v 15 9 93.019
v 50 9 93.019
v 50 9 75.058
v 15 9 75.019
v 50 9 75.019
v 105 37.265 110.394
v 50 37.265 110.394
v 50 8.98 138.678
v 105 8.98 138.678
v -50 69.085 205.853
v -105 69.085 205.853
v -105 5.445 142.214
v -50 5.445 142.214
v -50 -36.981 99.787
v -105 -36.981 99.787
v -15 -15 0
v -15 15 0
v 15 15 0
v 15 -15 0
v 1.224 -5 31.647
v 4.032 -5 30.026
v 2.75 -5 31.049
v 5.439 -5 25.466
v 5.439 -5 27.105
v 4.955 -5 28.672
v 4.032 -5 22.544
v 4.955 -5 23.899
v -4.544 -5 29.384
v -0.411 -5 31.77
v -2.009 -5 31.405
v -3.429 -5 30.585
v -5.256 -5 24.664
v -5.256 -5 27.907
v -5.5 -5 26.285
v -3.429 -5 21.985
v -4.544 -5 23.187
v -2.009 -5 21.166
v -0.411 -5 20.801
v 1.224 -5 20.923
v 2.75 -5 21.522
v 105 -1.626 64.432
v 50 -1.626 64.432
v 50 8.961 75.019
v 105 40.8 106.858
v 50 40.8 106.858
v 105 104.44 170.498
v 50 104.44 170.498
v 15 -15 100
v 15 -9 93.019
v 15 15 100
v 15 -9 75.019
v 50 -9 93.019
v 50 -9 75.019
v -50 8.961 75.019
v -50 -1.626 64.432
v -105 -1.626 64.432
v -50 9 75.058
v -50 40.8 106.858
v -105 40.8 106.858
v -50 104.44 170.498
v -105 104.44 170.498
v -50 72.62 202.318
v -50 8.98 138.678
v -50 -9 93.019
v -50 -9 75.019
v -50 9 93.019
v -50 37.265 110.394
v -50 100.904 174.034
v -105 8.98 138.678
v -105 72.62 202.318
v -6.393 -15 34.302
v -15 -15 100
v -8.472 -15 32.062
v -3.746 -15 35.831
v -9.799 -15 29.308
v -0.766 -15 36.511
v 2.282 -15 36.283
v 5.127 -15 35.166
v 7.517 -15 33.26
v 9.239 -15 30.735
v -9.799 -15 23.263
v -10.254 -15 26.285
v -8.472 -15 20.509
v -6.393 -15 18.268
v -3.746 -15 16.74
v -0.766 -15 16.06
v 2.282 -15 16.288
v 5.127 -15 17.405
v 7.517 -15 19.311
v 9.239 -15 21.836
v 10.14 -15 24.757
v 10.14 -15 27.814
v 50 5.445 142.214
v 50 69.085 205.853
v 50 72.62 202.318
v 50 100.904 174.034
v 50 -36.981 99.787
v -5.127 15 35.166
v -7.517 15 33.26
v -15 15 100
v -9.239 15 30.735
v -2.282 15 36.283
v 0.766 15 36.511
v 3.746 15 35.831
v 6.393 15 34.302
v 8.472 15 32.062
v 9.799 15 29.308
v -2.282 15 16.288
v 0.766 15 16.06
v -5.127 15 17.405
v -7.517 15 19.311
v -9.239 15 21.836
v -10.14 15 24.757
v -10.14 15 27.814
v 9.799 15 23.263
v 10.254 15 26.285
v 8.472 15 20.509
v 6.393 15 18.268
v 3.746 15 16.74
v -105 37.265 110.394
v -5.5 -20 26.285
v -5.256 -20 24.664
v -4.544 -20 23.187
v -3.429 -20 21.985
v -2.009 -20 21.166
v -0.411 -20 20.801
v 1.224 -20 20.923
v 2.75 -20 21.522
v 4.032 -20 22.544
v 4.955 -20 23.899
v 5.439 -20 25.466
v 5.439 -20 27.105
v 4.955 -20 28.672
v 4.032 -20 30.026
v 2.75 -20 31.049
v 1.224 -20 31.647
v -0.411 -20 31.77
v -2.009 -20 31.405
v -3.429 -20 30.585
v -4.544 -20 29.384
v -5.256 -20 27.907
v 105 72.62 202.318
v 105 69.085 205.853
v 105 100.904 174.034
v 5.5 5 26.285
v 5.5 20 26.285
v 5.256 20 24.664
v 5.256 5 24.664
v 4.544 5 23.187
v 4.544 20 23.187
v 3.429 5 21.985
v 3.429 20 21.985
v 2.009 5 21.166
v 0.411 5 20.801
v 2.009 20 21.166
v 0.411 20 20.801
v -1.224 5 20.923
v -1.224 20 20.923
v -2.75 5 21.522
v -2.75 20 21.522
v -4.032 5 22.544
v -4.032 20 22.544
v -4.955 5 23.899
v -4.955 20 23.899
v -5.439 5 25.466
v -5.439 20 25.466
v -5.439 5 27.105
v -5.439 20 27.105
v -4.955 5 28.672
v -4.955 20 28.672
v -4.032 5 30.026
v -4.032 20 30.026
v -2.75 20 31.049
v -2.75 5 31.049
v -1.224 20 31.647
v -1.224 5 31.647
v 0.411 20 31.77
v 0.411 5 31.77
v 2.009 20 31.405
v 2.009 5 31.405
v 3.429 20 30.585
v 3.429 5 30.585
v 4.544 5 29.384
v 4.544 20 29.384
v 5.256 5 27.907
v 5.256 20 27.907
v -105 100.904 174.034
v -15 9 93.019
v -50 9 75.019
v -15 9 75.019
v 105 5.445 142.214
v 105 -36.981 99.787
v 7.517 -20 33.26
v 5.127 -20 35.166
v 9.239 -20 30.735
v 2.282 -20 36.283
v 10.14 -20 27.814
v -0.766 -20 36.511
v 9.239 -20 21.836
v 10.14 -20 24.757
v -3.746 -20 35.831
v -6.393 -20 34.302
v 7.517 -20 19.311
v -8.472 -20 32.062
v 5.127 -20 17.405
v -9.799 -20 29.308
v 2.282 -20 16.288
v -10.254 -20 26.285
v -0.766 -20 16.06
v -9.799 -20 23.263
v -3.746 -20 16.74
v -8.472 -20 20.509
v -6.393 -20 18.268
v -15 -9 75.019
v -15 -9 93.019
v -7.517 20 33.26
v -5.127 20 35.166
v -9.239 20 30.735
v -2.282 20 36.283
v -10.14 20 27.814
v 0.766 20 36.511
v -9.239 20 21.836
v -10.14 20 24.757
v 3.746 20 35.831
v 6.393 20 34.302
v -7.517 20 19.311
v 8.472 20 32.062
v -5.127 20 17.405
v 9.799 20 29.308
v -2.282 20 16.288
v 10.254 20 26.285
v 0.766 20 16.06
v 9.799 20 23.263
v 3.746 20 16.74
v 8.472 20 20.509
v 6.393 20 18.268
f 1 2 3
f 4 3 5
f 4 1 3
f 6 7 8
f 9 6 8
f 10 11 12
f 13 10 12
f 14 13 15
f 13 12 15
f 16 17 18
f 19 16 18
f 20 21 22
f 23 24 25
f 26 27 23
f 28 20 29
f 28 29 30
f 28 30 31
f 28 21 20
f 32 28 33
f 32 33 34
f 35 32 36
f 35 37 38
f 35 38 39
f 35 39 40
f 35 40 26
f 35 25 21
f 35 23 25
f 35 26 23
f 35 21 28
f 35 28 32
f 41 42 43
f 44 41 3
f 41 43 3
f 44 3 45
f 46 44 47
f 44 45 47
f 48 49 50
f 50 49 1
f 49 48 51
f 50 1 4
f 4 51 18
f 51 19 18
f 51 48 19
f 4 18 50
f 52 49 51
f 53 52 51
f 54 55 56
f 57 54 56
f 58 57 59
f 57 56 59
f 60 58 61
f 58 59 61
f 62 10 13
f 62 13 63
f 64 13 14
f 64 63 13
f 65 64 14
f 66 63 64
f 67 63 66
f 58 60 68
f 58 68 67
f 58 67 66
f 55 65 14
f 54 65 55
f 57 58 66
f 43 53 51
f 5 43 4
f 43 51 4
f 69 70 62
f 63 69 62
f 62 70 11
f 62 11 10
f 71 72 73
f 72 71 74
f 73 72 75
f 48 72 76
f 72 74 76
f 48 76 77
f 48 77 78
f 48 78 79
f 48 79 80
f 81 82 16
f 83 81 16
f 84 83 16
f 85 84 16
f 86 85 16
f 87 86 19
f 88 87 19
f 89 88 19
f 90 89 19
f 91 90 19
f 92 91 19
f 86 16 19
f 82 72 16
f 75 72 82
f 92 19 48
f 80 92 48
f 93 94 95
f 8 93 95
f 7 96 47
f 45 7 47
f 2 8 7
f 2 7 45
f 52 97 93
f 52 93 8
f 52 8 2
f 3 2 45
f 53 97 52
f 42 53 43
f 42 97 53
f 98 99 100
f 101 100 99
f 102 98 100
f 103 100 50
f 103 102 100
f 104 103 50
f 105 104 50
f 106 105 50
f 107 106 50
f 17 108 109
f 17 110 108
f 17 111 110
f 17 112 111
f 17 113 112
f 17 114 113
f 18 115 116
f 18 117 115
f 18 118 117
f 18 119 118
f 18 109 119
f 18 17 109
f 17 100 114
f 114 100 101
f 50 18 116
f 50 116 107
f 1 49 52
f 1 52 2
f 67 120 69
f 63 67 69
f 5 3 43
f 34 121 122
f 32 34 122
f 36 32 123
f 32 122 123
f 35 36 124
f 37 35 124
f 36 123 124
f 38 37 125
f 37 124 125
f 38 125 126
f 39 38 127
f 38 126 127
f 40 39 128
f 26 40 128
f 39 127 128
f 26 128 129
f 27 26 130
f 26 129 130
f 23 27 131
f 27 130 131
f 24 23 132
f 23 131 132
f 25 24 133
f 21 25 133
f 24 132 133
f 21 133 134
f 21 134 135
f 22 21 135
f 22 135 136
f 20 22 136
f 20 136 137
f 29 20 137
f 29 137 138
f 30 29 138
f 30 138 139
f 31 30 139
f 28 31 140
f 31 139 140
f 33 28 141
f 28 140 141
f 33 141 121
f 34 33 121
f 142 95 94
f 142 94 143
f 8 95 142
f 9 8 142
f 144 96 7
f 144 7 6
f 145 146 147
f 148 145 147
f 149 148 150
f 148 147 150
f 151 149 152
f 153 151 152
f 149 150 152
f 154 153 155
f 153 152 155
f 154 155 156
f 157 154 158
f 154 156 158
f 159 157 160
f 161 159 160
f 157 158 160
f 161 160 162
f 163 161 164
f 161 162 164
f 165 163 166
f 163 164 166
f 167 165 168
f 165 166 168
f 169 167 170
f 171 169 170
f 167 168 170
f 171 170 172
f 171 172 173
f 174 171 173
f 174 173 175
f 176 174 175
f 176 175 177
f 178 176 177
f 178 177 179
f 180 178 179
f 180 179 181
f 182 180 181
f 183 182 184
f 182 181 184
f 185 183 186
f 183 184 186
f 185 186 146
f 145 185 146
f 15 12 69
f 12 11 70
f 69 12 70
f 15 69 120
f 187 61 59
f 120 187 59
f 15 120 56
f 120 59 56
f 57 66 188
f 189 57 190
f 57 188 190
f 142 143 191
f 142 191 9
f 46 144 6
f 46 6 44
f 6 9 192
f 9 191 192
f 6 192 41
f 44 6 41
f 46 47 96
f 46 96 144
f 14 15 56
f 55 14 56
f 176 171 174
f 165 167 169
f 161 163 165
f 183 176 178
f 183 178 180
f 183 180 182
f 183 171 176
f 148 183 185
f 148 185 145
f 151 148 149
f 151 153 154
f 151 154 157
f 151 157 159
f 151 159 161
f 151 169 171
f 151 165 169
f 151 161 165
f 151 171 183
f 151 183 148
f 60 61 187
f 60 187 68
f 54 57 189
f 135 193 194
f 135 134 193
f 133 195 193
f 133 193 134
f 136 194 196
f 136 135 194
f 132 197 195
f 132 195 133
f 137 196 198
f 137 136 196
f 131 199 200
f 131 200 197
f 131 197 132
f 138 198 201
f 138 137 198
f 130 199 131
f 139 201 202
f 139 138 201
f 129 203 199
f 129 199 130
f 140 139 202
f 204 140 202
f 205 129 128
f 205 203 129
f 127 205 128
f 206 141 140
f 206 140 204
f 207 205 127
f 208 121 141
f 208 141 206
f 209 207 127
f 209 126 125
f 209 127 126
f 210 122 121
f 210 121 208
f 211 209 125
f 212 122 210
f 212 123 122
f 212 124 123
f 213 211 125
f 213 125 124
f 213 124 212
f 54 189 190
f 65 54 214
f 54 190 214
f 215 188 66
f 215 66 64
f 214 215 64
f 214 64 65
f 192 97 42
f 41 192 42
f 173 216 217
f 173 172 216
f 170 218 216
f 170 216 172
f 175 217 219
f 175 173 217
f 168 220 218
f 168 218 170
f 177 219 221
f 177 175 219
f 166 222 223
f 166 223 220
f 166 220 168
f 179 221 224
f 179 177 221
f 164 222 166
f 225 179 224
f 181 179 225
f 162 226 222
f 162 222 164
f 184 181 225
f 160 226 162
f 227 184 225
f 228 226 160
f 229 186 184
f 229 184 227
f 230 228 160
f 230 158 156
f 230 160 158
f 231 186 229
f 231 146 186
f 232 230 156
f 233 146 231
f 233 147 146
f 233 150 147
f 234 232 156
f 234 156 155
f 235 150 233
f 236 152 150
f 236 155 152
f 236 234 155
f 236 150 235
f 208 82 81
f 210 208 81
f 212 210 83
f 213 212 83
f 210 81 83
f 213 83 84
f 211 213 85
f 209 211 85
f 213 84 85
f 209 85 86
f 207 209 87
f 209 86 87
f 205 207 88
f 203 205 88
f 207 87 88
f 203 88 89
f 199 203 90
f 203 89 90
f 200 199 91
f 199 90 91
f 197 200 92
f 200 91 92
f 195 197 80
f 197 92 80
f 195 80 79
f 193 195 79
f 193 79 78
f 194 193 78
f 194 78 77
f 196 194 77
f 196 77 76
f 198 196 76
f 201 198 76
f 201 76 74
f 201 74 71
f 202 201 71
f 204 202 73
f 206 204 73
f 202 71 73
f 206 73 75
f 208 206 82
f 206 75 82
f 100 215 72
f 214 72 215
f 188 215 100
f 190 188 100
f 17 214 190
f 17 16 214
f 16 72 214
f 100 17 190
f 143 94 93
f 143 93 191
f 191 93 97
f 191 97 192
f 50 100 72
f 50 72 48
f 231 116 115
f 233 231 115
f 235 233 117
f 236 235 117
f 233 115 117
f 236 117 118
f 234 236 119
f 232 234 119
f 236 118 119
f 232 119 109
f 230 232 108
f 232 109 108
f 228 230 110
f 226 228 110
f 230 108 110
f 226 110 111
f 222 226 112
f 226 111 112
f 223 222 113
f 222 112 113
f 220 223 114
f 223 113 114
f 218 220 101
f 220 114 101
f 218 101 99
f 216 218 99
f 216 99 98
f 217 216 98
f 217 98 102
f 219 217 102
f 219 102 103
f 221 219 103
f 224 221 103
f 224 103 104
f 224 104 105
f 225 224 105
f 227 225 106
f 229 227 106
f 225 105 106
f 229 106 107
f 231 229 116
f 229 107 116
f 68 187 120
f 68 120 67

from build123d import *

# Parameters (mm, degrees)
SKETCH_2_W               = 30
SKETCH_2_H               = 30
EXTRUDE_1_DEPTH          = 100
SKETCH_3_W               = 18
SKETCH_3_H               = 18
EXTRUDE_2_DEPTH          = 35
PATTERN_CIRCULAR_1_COUNT = 2
SKETCH_4_R               = 10.254249717
EXTRUDE_4_DEPTH          = 5
SKETCH_5_R               = 5.5
CUT_EXTRUDE_2_DEPTH      = 15
PATTERN_CIRCULAR_3_COUNT = 2
PATTERN_CIRCULAR_4_COUNT = 2
EXTRUDE_5_DEPTH          = 55
PATTERN_LINEAR_1_COUNT   = 2
PATTERN_LINEAR_1_PITCH   = 155
SKETCH_7_W               = 55
SKETCH_7_H               = 5
EXTRUDE_6_DEPTH          = 90


with BuildPart() as part:
    # 草图2 → 凸台-拉伸1 (new body)
    with BuildSketch(Plane.XY):
        Rectangle(SKETCH_2_W, SKETCH_2_H)
    extrude(amount=EXTRUDE_1_DEPTH)

    # 草图3 → 凸台-拉伸2 (add)
    with BuildSketch(Plane(origin=(15, 0, 0), x_dir=(0, 0, -1), z_dir=(1, 0, 0))):
        with Locations((-84.019000904, 0)):
            Rectangle(SKETCH_3_W, SKETCH_3_H)
    extrude_2 = extrude(amount=EXTRUDE_2_DEPTH)

    # 阵列(圆周)1: 凸台-拉伸2 ×2 about axis
    pattern_circular_1_axis = Axis((0, 0, 0), (0, 0, 1))
    for i in range(1, PATTERN_CIRCULAR_1_COUNT):
        add(extrude_2.rotate(pattern_circular_1_axis, i * 360 / PATTERN_CIRCULAR_1_COUNT))

    # 草图4 → 凸台-拉伸4 (add)
    with BuildSketch(Plane(origin=(0, 15, 0), x_dir=(1, 0, 0), z_dir=(0, 1, 0))):
        with Locations((0, -26.28538531)):
            Circle(SKETCH_4_R)
    extrude_4 = extrude(amount=EXTRUDE_4_DEPTH)

    # 草图5 → 切除-拉伸2 (cut)
    with BuildSketch(Plane(origin=(0, 20, 0), x_dir=(1, 0, 0), z_dir=(0, 1, 0))):
        with Locations((0, -26.28538531)):
            Circle(SKETCH_5_R)
    cut_extrude_2 = extrude(amount=-CUT_EXTRUDE_2_DEPTH, mode=Mode.SUBTRACT)

    # 阵列(圆周)3: 凸台-拉伸4 ×2 about axis
    pattern_circular_3_axis = Axis((0, 0, 100), (0, 0, -1))
    for i in range(1, PATTERN_CIRCULAR_3_COUNT):
        add(extrude_4.rotate(pattern_circular_3_axis, i * 360 / PATTERN_CIRCULAR_3_COUNT))

    # 阵列(圆周)4: 切除-拉伸2 ×2 about axis
    pattern_circular_4_axis = Axis((0, 0, 100), (0, 0, -1))
    for i in range(1, PATTERN_CIRCULAR_4_COUNT):
        add(cut_extrude_2.rotate(pattern_circular_4_axis, i * 360 / PATTERN_CIRCULAR_4_COUNT), mode=Mode.SUBTRACT)

    # 草图6 → 凸台-拉伸5 (add)
    with BuildSketch(Plane(origin=(50, 0, 0), x_dir=(0, 0, -1), z_dir=(1, 0, 0))):
        Polygon((-64.431978069, -1.626144526), (-106.85838494, 40.800262345), (-142.213724, 5.444923286), (-99.787317129, -36.981483585), align=None)
    extrude_5 = extrude(amount=EXTRUDE_5_DEPTH)

    # 阵列(线性)1: 凸台-拉伸5 ×2
    with Locations(*[(-i * PATTERN_LINEAR_1_PITCH, 0, 0) for i in range(1, PATTERN_LINEAR_1_COUNT)]):
        add(extrude_5)

    # 草图7 → 凸台-拉伸6 (add)
    with BuildSketch(Plane(origin=(0, 73.829323643, 73.829323643), x_dir=(1, 0, 0), z_dir=(0, 0.707106781, 0.707106781))):
        with Locations((77.5, -94.21014644)):
            Rectangle(SKETCH_7_W, SKETCH_7_H)
        with Locations((77.5, -49.21014644)):
            Rectangle(SKETCH_7_W, SKETCH_7_H)
        with Locations((-77.5, -94.21014644)):
            Rectangle(SKETCH_7_W, SKETCH_7_H)
        with Locations((-77.5, -49.21014644)):
            Rectangle(SKETCH_7_W, SKETCH_7_H)
    extrude(amount=EXTRUDE_6_DEPTH)


solid = part.part
